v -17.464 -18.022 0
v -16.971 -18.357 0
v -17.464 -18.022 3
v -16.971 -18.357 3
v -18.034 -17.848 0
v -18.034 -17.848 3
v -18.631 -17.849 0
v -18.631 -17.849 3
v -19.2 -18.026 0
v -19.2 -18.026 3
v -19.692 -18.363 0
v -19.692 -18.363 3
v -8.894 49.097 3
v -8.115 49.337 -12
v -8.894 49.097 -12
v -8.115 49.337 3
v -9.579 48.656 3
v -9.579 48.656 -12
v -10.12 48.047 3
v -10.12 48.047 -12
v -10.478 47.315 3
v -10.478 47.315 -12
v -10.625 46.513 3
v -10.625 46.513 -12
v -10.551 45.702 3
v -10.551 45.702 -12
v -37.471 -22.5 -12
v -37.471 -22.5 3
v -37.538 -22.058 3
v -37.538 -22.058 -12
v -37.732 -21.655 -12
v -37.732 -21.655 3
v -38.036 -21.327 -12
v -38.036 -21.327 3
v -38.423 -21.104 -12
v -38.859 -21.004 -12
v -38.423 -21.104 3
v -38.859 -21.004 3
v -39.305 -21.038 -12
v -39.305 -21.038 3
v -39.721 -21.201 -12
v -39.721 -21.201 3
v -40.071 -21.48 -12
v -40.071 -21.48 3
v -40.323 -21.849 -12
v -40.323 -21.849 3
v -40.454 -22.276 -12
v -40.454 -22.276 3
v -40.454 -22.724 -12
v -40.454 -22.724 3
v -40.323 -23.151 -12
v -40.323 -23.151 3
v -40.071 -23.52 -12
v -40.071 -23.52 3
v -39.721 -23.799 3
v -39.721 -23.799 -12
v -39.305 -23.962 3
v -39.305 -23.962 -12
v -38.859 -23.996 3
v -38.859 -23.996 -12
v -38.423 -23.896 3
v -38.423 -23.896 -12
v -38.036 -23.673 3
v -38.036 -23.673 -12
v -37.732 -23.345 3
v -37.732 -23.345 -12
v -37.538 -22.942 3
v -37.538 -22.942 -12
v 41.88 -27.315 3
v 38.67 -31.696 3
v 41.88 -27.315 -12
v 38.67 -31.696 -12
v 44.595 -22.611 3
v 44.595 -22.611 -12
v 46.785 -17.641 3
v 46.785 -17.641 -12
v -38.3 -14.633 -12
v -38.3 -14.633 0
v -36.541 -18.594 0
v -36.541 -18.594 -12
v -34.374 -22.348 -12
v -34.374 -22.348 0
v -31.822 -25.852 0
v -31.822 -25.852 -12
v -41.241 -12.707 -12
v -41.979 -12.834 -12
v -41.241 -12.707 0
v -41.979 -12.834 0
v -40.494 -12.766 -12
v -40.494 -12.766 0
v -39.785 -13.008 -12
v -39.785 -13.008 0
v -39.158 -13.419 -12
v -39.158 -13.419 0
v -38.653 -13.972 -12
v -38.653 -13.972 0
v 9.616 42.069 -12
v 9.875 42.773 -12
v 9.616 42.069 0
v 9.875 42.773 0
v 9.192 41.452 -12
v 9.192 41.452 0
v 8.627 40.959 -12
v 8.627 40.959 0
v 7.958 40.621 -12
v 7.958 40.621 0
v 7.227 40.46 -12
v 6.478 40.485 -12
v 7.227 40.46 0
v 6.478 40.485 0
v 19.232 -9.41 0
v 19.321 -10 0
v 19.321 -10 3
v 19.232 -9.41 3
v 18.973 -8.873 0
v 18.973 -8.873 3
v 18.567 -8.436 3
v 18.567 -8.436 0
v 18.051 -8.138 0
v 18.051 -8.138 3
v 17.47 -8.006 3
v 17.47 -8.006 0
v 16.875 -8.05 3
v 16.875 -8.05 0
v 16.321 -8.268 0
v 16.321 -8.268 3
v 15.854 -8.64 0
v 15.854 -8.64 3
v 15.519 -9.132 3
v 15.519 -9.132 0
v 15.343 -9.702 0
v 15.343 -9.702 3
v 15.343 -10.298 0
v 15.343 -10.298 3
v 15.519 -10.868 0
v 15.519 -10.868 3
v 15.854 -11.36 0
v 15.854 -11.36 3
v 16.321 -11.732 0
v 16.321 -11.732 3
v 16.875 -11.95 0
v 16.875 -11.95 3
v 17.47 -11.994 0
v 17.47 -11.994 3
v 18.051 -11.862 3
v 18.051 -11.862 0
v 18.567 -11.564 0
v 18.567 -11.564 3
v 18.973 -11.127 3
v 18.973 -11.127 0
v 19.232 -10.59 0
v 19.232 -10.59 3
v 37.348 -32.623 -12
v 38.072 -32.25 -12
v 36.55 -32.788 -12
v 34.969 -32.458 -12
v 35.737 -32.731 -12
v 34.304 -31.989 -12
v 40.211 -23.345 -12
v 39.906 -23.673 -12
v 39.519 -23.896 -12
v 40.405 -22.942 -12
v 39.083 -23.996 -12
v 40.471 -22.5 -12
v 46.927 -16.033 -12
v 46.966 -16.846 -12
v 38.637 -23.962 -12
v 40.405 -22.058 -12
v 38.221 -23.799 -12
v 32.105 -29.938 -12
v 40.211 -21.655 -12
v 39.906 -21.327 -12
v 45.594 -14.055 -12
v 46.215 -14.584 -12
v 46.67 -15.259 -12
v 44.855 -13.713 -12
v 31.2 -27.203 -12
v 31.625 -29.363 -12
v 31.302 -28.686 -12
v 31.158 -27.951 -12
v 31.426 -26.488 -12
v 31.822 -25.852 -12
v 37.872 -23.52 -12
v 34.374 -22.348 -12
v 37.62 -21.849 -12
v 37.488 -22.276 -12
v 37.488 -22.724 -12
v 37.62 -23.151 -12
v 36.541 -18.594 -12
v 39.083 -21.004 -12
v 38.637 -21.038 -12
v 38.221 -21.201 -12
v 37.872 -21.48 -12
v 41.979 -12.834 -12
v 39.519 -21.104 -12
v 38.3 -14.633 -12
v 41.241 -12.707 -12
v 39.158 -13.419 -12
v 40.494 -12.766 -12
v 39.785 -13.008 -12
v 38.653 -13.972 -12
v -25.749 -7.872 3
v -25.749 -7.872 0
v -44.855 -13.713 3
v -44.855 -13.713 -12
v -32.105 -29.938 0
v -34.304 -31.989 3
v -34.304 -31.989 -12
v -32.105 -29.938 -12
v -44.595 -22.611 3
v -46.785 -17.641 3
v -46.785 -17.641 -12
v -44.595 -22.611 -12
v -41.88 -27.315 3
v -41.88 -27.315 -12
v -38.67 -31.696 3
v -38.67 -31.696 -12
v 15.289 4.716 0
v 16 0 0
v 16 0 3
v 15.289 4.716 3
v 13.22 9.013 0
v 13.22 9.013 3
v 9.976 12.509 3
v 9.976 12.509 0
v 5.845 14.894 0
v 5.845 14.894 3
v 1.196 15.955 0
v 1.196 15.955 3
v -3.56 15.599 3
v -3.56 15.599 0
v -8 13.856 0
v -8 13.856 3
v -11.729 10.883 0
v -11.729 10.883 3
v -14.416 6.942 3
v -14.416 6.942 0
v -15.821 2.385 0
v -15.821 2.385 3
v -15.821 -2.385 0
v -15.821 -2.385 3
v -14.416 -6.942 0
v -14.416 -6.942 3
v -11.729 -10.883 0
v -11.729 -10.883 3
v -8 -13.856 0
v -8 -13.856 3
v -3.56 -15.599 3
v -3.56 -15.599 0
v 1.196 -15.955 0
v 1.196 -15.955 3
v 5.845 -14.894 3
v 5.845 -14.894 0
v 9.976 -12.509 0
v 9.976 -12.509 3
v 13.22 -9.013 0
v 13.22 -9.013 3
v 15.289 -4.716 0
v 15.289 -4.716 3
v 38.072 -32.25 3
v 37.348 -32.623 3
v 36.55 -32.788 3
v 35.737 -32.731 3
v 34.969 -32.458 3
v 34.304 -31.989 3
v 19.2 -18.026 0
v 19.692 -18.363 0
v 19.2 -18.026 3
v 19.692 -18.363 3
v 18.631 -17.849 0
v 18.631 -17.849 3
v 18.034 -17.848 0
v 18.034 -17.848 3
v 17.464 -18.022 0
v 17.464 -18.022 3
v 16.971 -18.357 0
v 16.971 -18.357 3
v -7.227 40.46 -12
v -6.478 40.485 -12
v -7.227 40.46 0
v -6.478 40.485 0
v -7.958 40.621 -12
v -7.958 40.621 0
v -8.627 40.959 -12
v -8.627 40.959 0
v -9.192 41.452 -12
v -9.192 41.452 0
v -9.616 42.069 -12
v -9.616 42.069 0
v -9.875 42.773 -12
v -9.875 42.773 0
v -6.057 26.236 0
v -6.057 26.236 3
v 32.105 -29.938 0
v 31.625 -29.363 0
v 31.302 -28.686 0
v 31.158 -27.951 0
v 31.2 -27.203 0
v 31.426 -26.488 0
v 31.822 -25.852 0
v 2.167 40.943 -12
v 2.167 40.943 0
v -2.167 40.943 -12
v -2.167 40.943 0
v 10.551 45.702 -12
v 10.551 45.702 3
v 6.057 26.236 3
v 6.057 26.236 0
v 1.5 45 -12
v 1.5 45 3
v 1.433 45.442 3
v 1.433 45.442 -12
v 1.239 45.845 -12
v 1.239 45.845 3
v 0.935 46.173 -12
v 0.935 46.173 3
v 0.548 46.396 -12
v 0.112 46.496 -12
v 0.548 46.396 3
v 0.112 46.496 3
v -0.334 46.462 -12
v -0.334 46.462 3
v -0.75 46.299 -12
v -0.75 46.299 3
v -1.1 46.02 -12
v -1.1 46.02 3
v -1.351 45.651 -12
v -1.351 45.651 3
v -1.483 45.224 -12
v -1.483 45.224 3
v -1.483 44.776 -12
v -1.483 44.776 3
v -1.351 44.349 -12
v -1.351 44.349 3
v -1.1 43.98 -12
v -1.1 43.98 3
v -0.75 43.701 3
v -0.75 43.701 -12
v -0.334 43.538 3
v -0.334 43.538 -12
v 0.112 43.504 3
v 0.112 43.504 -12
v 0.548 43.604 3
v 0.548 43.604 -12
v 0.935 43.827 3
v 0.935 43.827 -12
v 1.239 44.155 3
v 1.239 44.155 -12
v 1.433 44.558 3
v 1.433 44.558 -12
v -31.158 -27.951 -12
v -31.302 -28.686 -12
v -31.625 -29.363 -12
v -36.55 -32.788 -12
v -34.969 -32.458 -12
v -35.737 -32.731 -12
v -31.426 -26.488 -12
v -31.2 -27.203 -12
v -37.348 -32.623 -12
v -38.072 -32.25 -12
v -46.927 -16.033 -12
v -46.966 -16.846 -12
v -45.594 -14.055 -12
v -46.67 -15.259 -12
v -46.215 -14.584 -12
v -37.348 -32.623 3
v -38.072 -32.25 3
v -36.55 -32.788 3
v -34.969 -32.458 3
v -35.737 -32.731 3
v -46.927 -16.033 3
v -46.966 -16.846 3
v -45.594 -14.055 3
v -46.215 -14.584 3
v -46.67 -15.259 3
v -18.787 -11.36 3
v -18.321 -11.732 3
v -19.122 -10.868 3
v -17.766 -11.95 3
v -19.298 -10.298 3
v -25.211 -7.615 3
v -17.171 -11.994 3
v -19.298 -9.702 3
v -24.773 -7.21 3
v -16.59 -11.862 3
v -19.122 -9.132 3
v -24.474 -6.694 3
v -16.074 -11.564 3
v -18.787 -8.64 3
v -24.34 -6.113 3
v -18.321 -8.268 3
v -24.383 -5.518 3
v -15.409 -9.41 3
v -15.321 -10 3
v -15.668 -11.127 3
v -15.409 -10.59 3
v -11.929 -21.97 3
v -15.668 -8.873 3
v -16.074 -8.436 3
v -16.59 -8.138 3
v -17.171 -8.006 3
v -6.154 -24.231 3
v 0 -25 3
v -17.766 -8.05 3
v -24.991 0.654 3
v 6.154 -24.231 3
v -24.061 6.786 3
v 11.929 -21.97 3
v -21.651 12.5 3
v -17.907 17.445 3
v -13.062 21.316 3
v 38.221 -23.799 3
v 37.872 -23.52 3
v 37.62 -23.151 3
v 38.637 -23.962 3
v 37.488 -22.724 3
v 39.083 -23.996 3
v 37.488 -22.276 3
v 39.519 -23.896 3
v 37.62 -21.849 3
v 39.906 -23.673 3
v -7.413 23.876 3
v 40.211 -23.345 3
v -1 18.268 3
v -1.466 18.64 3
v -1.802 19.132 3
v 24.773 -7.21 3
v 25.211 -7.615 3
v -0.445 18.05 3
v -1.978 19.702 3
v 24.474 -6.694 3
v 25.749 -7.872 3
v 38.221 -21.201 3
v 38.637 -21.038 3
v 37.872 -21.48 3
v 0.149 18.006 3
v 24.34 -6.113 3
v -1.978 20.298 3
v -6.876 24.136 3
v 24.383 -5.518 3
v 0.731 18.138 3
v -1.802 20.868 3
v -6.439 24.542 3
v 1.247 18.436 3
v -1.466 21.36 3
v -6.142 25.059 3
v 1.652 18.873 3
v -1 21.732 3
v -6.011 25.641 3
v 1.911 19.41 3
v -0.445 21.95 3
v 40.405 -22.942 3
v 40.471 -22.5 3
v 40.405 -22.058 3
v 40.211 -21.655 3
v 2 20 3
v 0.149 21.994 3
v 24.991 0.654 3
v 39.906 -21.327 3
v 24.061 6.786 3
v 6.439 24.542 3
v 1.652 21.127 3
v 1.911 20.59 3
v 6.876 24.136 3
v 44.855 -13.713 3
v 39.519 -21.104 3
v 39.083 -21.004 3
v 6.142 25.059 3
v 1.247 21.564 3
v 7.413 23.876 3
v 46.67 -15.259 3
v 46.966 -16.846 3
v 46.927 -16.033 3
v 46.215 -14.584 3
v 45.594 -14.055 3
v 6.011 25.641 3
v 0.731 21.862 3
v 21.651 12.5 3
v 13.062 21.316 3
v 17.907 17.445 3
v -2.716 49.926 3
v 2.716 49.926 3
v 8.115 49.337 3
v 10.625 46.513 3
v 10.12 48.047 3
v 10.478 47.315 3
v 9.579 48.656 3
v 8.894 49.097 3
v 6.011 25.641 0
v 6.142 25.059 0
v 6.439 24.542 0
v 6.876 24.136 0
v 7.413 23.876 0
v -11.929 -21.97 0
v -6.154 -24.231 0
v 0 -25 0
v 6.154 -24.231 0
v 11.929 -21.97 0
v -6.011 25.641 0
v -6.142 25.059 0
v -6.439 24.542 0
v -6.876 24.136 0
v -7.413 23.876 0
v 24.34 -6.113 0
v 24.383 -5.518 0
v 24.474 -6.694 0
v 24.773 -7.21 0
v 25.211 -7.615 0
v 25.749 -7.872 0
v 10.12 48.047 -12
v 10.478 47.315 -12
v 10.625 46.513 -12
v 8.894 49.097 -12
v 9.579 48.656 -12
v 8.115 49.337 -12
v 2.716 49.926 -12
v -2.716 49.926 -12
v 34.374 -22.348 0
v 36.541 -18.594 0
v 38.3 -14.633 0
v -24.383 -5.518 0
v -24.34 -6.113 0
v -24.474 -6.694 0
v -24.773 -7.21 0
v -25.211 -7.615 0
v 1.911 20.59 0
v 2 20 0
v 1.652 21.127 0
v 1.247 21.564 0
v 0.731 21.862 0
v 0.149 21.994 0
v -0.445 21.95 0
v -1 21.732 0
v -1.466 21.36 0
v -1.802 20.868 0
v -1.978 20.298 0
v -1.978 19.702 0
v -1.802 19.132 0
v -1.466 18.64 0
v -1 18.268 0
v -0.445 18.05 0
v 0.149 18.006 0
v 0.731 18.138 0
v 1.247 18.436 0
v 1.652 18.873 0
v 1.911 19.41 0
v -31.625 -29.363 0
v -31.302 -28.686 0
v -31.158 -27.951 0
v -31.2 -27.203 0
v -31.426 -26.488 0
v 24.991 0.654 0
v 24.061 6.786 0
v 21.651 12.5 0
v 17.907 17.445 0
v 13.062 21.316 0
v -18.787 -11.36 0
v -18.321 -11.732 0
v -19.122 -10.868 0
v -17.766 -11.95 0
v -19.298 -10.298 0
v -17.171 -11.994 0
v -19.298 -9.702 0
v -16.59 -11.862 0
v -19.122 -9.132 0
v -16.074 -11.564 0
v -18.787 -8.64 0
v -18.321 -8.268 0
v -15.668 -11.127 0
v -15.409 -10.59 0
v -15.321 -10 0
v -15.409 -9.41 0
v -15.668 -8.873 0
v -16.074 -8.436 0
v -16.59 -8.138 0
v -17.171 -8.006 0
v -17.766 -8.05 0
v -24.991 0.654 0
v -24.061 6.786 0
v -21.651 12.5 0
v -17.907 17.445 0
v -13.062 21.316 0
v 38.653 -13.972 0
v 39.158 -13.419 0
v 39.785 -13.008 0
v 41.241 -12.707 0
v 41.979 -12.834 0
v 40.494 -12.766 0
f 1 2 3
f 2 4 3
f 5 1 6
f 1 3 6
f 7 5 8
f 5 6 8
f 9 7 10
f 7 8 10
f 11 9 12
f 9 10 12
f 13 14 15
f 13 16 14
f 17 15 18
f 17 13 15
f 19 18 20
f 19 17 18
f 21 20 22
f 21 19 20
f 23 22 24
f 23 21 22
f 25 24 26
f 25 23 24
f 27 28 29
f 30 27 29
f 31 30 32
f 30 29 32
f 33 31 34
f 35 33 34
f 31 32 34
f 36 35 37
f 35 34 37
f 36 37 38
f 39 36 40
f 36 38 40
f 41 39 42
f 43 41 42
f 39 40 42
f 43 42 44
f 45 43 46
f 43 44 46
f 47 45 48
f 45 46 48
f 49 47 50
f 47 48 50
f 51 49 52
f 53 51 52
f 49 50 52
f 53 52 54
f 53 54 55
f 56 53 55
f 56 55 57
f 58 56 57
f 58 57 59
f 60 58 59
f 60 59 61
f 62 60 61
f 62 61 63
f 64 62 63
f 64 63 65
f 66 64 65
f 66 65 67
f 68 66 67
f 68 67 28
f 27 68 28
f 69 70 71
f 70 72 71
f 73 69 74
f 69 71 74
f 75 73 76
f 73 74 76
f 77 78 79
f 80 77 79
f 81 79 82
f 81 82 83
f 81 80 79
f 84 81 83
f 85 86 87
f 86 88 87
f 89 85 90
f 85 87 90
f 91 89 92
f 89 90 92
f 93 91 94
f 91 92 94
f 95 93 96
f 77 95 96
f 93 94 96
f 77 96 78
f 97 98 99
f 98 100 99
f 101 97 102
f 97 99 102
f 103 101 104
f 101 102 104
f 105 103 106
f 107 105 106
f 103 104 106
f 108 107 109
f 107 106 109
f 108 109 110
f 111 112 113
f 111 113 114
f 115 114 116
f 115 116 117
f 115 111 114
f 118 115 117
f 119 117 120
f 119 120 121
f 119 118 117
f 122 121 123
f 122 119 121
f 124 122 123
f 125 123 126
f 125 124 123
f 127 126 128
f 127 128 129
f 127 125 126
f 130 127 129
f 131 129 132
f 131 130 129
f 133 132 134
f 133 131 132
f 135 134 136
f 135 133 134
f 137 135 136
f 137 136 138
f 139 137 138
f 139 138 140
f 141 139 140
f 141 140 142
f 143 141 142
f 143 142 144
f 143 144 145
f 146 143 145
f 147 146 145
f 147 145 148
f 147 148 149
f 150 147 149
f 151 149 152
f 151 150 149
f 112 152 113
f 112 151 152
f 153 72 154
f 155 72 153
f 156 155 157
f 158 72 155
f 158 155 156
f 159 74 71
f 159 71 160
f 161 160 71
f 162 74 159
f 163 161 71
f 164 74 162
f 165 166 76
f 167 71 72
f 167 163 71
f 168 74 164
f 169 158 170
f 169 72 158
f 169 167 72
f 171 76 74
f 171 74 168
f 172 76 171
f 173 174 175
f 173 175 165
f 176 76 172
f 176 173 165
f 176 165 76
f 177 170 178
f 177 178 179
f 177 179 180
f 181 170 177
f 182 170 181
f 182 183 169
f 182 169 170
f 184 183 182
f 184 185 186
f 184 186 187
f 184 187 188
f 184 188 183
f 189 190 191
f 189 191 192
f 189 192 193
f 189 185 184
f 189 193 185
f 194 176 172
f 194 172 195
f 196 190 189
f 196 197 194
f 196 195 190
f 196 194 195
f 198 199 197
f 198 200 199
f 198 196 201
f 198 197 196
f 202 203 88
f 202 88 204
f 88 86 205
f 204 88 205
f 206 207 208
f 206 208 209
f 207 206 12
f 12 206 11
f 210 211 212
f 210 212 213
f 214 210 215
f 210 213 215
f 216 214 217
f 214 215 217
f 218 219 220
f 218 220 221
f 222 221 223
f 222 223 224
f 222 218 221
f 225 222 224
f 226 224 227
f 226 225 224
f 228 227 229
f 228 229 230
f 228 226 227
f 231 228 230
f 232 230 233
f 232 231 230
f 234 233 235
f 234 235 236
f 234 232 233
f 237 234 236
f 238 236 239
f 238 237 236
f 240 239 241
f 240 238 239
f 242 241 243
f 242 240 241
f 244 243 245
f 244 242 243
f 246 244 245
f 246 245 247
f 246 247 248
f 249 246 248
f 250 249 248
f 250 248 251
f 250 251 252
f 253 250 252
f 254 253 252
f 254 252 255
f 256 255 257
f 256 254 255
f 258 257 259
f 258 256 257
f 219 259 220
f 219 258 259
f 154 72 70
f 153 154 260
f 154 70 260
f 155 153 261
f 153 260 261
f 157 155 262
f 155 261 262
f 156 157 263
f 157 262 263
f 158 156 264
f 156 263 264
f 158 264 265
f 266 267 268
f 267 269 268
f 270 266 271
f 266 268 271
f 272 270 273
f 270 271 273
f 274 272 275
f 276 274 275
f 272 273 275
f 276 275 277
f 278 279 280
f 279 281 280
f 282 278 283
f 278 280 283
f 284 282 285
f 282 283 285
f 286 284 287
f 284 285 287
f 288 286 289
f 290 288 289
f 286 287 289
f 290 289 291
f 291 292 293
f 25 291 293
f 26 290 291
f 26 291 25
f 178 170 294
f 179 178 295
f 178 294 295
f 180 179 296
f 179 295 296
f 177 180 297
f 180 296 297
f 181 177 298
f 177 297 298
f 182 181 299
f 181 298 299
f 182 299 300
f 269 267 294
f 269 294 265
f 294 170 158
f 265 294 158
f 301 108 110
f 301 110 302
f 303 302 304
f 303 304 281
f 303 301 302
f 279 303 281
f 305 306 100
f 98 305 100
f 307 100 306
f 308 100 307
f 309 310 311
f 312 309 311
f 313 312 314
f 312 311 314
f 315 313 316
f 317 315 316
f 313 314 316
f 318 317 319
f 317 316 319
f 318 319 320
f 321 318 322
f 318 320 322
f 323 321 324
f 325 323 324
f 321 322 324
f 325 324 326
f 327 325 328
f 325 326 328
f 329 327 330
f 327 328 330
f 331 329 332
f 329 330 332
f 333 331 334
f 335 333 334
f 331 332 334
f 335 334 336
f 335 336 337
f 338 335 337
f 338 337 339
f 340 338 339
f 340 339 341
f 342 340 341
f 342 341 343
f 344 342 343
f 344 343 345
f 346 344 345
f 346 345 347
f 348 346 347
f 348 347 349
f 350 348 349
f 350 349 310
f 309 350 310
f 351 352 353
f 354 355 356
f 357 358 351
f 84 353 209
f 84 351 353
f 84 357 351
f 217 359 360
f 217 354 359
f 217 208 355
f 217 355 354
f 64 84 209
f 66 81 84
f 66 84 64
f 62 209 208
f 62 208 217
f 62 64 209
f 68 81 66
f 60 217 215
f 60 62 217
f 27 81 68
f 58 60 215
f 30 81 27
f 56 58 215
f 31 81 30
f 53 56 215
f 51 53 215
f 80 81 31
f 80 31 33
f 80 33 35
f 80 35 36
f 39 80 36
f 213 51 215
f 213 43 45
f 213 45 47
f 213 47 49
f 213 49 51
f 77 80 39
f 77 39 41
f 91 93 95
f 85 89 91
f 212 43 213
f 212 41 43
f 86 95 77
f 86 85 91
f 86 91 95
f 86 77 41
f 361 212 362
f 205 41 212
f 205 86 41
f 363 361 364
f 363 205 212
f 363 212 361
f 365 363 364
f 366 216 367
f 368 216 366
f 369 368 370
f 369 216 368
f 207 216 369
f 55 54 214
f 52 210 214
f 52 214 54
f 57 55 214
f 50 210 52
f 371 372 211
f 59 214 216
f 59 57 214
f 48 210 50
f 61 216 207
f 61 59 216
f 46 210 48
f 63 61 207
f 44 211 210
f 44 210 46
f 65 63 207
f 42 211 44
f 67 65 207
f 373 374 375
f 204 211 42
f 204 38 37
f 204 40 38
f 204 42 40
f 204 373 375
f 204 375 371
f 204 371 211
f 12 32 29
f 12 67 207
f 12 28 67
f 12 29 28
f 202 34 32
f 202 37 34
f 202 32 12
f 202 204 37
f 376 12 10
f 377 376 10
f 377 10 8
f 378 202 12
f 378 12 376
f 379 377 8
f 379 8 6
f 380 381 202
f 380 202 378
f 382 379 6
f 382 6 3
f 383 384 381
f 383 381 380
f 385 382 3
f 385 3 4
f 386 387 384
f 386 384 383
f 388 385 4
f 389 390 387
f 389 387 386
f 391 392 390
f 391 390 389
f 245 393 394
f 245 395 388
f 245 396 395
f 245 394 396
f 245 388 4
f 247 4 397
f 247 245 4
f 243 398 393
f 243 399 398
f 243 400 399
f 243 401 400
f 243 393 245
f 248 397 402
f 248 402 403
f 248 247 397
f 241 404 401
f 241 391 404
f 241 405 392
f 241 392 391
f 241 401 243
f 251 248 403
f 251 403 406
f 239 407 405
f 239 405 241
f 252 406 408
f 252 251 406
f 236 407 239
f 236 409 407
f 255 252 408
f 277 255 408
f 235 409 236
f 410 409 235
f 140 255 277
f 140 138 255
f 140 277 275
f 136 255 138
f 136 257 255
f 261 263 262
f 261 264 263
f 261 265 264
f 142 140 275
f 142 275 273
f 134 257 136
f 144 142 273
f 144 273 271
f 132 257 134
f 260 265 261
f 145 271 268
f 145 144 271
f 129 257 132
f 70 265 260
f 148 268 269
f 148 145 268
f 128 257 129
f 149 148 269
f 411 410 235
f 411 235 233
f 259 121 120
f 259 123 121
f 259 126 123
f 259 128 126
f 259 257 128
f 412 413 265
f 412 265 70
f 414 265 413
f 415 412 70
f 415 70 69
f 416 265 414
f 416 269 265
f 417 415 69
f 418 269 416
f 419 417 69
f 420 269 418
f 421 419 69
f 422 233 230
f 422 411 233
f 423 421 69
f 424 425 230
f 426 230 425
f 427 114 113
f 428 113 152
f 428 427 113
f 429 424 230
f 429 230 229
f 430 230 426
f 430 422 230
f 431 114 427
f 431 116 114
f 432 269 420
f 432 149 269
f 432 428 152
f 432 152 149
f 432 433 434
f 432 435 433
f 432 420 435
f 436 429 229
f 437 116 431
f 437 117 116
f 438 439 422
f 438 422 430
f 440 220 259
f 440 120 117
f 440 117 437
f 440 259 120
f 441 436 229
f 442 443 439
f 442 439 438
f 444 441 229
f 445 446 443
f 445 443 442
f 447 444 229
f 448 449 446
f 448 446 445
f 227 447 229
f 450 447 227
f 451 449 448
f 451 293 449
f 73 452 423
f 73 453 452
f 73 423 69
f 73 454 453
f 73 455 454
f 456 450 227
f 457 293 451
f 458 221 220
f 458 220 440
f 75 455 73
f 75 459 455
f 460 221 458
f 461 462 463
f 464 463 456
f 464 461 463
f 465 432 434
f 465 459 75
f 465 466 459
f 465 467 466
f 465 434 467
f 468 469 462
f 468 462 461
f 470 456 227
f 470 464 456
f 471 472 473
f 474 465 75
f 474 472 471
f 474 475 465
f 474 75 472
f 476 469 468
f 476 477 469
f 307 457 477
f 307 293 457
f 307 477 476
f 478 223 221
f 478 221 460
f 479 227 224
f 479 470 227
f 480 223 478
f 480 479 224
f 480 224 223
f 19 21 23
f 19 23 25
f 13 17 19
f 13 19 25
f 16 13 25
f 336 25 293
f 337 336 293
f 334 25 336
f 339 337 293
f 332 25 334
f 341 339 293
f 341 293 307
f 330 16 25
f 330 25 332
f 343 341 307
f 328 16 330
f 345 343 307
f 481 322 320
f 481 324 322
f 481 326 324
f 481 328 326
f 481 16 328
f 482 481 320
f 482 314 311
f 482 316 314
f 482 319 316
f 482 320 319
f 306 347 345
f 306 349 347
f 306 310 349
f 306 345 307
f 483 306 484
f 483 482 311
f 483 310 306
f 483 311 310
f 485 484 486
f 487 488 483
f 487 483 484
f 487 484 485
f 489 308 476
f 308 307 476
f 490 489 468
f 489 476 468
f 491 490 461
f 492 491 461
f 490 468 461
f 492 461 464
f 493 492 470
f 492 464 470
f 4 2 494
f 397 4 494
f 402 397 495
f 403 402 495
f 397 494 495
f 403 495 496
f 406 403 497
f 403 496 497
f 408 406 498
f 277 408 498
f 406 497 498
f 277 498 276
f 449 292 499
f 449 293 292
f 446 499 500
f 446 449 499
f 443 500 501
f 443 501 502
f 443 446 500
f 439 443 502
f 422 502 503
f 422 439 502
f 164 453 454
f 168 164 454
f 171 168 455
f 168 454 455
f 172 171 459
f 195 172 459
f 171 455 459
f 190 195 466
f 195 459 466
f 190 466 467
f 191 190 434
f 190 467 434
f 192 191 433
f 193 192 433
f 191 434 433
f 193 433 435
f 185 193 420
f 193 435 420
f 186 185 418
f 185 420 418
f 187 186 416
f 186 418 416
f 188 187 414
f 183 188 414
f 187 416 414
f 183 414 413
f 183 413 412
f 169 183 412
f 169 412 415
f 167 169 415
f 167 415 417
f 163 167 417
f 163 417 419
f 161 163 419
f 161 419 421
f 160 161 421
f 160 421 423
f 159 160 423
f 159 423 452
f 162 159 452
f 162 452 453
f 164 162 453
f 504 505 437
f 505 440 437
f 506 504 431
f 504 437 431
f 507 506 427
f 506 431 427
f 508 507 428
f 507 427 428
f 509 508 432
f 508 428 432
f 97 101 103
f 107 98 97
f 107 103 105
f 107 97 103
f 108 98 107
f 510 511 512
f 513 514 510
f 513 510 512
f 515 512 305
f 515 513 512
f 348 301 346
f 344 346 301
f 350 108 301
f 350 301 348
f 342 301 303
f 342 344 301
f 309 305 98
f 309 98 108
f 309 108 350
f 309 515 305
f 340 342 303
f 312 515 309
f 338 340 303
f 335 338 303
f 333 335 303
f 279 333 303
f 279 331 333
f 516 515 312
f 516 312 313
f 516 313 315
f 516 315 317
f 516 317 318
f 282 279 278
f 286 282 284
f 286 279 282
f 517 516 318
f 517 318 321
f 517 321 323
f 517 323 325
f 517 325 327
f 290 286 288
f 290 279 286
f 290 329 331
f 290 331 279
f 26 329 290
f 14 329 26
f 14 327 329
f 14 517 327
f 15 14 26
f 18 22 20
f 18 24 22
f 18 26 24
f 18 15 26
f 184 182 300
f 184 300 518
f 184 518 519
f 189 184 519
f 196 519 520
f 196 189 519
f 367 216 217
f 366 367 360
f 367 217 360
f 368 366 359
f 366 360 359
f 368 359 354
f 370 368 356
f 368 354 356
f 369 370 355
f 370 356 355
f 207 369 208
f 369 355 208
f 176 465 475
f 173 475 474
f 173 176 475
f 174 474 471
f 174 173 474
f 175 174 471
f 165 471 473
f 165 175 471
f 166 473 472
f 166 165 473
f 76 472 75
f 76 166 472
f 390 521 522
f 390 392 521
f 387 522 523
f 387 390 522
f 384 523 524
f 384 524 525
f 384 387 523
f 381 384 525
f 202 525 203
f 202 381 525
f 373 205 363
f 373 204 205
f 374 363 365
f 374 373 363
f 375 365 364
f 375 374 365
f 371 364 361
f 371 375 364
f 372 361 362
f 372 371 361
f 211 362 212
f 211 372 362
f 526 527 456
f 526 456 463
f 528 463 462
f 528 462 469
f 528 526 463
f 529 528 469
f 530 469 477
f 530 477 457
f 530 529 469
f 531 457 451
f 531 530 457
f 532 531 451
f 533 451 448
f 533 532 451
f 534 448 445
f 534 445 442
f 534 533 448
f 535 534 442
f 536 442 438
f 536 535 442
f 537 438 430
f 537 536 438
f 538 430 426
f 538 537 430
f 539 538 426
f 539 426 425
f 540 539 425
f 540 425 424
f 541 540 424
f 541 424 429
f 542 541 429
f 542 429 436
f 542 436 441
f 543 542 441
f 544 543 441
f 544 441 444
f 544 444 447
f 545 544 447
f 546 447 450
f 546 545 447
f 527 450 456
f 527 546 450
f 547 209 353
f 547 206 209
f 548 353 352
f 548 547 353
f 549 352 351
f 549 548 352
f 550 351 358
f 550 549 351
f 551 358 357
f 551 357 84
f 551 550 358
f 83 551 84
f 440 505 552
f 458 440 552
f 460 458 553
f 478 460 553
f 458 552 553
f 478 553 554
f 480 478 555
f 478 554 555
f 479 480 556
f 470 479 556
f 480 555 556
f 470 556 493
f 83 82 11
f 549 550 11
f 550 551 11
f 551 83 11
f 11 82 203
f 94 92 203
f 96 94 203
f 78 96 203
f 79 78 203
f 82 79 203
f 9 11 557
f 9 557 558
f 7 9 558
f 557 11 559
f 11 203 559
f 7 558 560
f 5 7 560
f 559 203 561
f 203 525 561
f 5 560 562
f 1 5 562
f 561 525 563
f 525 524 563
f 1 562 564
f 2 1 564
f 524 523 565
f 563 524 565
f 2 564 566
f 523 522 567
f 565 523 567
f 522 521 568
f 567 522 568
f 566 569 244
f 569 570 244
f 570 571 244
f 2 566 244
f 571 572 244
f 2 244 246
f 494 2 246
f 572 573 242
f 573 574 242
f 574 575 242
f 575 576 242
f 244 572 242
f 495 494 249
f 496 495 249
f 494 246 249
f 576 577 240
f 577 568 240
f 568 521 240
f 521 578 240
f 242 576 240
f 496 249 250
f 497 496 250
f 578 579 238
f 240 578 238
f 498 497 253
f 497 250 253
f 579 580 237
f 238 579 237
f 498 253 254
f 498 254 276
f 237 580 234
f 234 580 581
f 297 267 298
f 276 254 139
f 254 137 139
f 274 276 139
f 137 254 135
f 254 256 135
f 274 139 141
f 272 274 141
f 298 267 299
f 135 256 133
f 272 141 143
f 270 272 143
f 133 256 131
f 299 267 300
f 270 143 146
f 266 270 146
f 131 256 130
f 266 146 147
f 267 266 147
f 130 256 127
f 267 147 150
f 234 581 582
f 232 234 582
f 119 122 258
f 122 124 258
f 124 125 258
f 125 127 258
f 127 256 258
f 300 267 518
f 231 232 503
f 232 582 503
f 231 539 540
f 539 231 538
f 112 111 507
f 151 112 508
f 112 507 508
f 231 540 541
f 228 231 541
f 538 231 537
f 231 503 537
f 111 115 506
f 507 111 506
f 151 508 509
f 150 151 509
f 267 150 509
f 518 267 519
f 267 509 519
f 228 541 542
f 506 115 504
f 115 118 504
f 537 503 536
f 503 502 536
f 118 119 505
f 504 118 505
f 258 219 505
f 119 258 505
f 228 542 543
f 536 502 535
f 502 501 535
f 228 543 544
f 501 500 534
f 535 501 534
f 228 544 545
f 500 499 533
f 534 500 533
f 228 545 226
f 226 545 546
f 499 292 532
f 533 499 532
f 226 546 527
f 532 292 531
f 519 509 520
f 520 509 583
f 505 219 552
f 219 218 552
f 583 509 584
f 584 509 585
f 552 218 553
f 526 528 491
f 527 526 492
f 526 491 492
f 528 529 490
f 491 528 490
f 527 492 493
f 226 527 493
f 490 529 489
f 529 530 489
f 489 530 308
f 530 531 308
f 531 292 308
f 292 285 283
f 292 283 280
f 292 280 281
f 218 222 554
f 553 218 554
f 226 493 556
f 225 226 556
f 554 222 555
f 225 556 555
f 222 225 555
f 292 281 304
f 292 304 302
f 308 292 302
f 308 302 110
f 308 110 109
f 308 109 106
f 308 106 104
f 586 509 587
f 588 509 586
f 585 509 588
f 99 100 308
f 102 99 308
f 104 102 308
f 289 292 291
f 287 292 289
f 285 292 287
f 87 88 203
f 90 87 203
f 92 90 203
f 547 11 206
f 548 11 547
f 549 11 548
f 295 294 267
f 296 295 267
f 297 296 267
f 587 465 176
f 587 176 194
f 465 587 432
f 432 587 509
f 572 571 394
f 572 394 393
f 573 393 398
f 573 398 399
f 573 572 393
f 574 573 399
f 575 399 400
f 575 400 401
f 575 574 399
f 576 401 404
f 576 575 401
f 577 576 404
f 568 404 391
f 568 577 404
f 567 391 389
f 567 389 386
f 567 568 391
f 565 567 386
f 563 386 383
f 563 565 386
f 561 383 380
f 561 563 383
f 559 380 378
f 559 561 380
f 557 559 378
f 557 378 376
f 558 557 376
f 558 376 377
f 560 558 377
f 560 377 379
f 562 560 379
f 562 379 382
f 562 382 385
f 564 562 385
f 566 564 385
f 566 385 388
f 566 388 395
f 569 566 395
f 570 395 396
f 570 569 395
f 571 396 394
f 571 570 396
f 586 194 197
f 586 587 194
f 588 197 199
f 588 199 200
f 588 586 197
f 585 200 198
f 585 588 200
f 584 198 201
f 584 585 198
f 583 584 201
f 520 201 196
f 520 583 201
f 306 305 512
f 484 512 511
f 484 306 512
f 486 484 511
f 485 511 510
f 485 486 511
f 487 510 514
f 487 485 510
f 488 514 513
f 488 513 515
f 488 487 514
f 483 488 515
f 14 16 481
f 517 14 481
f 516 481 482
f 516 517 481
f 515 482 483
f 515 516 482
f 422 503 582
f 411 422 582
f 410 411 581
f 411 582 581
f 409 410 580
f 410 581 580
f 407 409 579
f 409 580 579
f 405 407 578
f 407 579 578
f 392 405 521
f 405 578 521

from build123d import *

# Parameters (mm, degrees)
SKETCH_1_R          = 16
SKETCH_1_R_2        = 2.0000000000000004
SKETCH_1_R_3        = 2.0000000000000013
SKETCH_1_R_4        = 1.9999999999999996
EXTRUDE_1_DEPTH     = 3
EXTRUDE_START       = 12
EXTRUDE_2_DEPTH     = 12
SKETCH_4_R          = 1.5000000000000009
SKETCH_4_R_2        = 1.5000000000024705
SKETCH_4_R_3        = 1.5000000000036489
CUT_EXTRUDE_1_DEPTH = 71.79051465905462
FILLET_1_R          = 2
FILLET_2_R          = 3


with BuildPart() as part:
    # 草图1 → 凸台-拉伸1 (new body)
    with BuildSketch(Plane.XY):
        with BuildLine():
            Line((5.623776358596461, 24.359251619630925), (11.247552717192923, 48.71850323926185))
            ThreePointArc((11.247552717192923, 48.71850323926185), (-3.7441e-13, 50.000000000000014), (-11.247552717193646, 48.71850323926167))
            Line((-11.247552717193646, 48.71850323926167), (-5.623776358596823, 24.359251619630832))
            ThreePointArc((-5.623776358596823, 24.359251619630832), (-21.650635094611058, 12.499999999999835), (-23.90761889907584, -7.309292618068593))
            Line((-23.90761889907584, -7.309292618068593), (-47.81523779815182, -14.61858523613672))
            ThreePointArc((-47.81523779815182, -14.61858523613672), (-43.30127018922199, -24.999999999999925), (-36.56768508095856, -34.099918003124884))
            Line((-36.56768508095856, -34.099918003124884), (-18.28384254047911, -17.04995900156262))
            ThreePointArc((-18.28384254047911, -17.04995900156262), (2.0137e-13, -24.999999999999996), (18.283842540479387, -17.04995900156234))
            Line((18.283842540479387, -17.04995900156234), (36.56768508095862, -34.09991800312487))
            ThreePointArc((36.56768508095862, -34.09991800312487), (43.30127018922202, -24.999999999999897), (47.815237798151834, -14.618585236136676))
            Line((47.815237798151834, -14.618585236136676), (23.907618899075946, -7.309292618068216))
            ThreePointArc((23.907618899075946, -7.309292618068216), (21.650635094610866, 12.500000000000162), (5.623776358596461, 24.359251619630925))
        make_face()
        Circle(SKETCH_1_R, mode=Mode.SUBTRACT)
        with Locations((1.302e-14, 20)):
            Circle(SKETCH_1_R_2, mode=Mode.SUBTRACT)
        with Locations((17.320508075688725, -10.000000000000092)):
            Circle(SKETCH_1_R_3, mode=Mode.SUBTRACT)
        with Locations((-17.320508075688874, -9.999999999999826)):
            Circle(SKETCH_1_R_4, mode=Mode.SUBTRACT)
    extrude(amount=EXTRUDE_1_DEPTH)

    # 草图3 → 凸台-拉伸2 (add)
    with BuildSketch(Plane(origin=(0, 0, 0), x_dir=(-1, 0, 0), z_dir=(0, 0, -1)).offset(EXTRUDE_START)):
        with BuildLine():
            Line((-11.247552717192923, 48.71850323926185), (-9.222993228098195, 39.949172656194705))
            ThreePointArc((-9.222993228098195, 39.949172656194705), (3.0294e-13, 41), (9.22299322809879, 39.94917265619457))
            Line((9.22299322809879, 39.94917265619457), (11.247552717193646, 48.71850323926167))
            ThreePointArc((11.247552717193646, 48.71850323926167), (3.8054e-13, 50), (-11.247552717192923, 48.71850323926185))
        make_face()
        with BuildLine():
            Line((47.815237798151635, -14.618585236137392), (39.20849499448435, -11.987239893632658))
            ThreePointArc((39.20849499448435, -11.987239893632658), (35.507041555161756, -20.500000000000437), (29.98550176638565, -27.96193276256283))
            Line((29.98550176638565, -27.96193276256283), (36.56768508095811, -34.099918003125396))
            ThreePointArc((36.56768508095811, -34.099918003125396), (43.30127018922164, -25.00000000000053), (47.815237798151635, -14.618585236137392))
        make_face()
        with BuildLine():
            Line((-36.56768508095907, -34.09991800312435), (-29.98550176638619, -27.96193276256223))
            ThreePointArc((-29.98550176638619, -27.96193276256223), (-35.50704155516215, -20.499999999999734), (-39.20849499448456, -11.987239893631878))
            Line((-39.20849499448456, -11.987239893631878), (-47.815237798152026, -14.618585236136003))
            ThreePointArc((-47.815237798152026, -14.618585236136003), (-43.30127018922234, -24.999999999999286), (-36.56768508095907, -34.09991800312435))
        make_face()
    extrude(amount=-EXTRUDE_2_DEPTH)

    # 草图4 → 切除-拉伸1 (cut, through all)
    with BuildSketch(Plane.XY.offset(3)):
        with Locations((0, 45)):
            Circle(SKETCH_4_R)
        with Locations((38.97114317030261, -22.499999999998334)):
            Circle(SKETCH_4_R_2)
        with Locations((-38.97114317029686, -22.500000000001673)):
            Circle(SKETCH_4_R_3)
    extrude(amount=-CUT_EXTRUDE_1_DEPTH, mode=Mode.SUBTRACT)

    # 圆角1
    fillet_1_edges = [part.edges().sort_by_distance(p)[0] for p in [
        (5.623776358596462, 24.359251619630925, 1.5),
        (23.907618899075946, -7.309292618068216, 1.5),
        (18.283842540479387, -17.049959001562343, 1.5),
        (-18.28384254047911, -17.04995900156262, 1.5),
        (-23.90761889907584, -7.309292618068593, 1.5),
        (-5.623776358596823, 24.359251619630832, 1.5),
    ]]
    fillet(fillet_1_edges, radius=FILLET_1_R)

    # 圆角2
    fillet_2_edges = [part.edges().sort_by_distance(p)[0] for p in [
        (11.24755271719292, 48.71850323926185, -4.5),
        (47.81523779815193, -14.61858523613634, -4.5),
        (36.567685080958846, -34.099918003124614, -4.5),
        (-36.56768508095834, -34.09991800312514, -4.5),
        (-47.81523779815173, -14.618585236137056, -4.5),
        (-11.247552717193646, 48.71850323926167, -4.5),
        (-39.208494994484354, -11.987239893632658, -6),
        (-29.985501766385653, -27.96193276256283, -6),
        (9.222993228098195, 39.949172656194705, -6),
        (-9.222993228098792, 39.94917265619457, -6),
        (29.98550176638619, -27.96193276256223, -6),
        (39.20849499448456, -11.987239893631878, -6),
    ]]
    fillet(fillet_2_edges, radius=FILLET_2_R)


solid = part.part
